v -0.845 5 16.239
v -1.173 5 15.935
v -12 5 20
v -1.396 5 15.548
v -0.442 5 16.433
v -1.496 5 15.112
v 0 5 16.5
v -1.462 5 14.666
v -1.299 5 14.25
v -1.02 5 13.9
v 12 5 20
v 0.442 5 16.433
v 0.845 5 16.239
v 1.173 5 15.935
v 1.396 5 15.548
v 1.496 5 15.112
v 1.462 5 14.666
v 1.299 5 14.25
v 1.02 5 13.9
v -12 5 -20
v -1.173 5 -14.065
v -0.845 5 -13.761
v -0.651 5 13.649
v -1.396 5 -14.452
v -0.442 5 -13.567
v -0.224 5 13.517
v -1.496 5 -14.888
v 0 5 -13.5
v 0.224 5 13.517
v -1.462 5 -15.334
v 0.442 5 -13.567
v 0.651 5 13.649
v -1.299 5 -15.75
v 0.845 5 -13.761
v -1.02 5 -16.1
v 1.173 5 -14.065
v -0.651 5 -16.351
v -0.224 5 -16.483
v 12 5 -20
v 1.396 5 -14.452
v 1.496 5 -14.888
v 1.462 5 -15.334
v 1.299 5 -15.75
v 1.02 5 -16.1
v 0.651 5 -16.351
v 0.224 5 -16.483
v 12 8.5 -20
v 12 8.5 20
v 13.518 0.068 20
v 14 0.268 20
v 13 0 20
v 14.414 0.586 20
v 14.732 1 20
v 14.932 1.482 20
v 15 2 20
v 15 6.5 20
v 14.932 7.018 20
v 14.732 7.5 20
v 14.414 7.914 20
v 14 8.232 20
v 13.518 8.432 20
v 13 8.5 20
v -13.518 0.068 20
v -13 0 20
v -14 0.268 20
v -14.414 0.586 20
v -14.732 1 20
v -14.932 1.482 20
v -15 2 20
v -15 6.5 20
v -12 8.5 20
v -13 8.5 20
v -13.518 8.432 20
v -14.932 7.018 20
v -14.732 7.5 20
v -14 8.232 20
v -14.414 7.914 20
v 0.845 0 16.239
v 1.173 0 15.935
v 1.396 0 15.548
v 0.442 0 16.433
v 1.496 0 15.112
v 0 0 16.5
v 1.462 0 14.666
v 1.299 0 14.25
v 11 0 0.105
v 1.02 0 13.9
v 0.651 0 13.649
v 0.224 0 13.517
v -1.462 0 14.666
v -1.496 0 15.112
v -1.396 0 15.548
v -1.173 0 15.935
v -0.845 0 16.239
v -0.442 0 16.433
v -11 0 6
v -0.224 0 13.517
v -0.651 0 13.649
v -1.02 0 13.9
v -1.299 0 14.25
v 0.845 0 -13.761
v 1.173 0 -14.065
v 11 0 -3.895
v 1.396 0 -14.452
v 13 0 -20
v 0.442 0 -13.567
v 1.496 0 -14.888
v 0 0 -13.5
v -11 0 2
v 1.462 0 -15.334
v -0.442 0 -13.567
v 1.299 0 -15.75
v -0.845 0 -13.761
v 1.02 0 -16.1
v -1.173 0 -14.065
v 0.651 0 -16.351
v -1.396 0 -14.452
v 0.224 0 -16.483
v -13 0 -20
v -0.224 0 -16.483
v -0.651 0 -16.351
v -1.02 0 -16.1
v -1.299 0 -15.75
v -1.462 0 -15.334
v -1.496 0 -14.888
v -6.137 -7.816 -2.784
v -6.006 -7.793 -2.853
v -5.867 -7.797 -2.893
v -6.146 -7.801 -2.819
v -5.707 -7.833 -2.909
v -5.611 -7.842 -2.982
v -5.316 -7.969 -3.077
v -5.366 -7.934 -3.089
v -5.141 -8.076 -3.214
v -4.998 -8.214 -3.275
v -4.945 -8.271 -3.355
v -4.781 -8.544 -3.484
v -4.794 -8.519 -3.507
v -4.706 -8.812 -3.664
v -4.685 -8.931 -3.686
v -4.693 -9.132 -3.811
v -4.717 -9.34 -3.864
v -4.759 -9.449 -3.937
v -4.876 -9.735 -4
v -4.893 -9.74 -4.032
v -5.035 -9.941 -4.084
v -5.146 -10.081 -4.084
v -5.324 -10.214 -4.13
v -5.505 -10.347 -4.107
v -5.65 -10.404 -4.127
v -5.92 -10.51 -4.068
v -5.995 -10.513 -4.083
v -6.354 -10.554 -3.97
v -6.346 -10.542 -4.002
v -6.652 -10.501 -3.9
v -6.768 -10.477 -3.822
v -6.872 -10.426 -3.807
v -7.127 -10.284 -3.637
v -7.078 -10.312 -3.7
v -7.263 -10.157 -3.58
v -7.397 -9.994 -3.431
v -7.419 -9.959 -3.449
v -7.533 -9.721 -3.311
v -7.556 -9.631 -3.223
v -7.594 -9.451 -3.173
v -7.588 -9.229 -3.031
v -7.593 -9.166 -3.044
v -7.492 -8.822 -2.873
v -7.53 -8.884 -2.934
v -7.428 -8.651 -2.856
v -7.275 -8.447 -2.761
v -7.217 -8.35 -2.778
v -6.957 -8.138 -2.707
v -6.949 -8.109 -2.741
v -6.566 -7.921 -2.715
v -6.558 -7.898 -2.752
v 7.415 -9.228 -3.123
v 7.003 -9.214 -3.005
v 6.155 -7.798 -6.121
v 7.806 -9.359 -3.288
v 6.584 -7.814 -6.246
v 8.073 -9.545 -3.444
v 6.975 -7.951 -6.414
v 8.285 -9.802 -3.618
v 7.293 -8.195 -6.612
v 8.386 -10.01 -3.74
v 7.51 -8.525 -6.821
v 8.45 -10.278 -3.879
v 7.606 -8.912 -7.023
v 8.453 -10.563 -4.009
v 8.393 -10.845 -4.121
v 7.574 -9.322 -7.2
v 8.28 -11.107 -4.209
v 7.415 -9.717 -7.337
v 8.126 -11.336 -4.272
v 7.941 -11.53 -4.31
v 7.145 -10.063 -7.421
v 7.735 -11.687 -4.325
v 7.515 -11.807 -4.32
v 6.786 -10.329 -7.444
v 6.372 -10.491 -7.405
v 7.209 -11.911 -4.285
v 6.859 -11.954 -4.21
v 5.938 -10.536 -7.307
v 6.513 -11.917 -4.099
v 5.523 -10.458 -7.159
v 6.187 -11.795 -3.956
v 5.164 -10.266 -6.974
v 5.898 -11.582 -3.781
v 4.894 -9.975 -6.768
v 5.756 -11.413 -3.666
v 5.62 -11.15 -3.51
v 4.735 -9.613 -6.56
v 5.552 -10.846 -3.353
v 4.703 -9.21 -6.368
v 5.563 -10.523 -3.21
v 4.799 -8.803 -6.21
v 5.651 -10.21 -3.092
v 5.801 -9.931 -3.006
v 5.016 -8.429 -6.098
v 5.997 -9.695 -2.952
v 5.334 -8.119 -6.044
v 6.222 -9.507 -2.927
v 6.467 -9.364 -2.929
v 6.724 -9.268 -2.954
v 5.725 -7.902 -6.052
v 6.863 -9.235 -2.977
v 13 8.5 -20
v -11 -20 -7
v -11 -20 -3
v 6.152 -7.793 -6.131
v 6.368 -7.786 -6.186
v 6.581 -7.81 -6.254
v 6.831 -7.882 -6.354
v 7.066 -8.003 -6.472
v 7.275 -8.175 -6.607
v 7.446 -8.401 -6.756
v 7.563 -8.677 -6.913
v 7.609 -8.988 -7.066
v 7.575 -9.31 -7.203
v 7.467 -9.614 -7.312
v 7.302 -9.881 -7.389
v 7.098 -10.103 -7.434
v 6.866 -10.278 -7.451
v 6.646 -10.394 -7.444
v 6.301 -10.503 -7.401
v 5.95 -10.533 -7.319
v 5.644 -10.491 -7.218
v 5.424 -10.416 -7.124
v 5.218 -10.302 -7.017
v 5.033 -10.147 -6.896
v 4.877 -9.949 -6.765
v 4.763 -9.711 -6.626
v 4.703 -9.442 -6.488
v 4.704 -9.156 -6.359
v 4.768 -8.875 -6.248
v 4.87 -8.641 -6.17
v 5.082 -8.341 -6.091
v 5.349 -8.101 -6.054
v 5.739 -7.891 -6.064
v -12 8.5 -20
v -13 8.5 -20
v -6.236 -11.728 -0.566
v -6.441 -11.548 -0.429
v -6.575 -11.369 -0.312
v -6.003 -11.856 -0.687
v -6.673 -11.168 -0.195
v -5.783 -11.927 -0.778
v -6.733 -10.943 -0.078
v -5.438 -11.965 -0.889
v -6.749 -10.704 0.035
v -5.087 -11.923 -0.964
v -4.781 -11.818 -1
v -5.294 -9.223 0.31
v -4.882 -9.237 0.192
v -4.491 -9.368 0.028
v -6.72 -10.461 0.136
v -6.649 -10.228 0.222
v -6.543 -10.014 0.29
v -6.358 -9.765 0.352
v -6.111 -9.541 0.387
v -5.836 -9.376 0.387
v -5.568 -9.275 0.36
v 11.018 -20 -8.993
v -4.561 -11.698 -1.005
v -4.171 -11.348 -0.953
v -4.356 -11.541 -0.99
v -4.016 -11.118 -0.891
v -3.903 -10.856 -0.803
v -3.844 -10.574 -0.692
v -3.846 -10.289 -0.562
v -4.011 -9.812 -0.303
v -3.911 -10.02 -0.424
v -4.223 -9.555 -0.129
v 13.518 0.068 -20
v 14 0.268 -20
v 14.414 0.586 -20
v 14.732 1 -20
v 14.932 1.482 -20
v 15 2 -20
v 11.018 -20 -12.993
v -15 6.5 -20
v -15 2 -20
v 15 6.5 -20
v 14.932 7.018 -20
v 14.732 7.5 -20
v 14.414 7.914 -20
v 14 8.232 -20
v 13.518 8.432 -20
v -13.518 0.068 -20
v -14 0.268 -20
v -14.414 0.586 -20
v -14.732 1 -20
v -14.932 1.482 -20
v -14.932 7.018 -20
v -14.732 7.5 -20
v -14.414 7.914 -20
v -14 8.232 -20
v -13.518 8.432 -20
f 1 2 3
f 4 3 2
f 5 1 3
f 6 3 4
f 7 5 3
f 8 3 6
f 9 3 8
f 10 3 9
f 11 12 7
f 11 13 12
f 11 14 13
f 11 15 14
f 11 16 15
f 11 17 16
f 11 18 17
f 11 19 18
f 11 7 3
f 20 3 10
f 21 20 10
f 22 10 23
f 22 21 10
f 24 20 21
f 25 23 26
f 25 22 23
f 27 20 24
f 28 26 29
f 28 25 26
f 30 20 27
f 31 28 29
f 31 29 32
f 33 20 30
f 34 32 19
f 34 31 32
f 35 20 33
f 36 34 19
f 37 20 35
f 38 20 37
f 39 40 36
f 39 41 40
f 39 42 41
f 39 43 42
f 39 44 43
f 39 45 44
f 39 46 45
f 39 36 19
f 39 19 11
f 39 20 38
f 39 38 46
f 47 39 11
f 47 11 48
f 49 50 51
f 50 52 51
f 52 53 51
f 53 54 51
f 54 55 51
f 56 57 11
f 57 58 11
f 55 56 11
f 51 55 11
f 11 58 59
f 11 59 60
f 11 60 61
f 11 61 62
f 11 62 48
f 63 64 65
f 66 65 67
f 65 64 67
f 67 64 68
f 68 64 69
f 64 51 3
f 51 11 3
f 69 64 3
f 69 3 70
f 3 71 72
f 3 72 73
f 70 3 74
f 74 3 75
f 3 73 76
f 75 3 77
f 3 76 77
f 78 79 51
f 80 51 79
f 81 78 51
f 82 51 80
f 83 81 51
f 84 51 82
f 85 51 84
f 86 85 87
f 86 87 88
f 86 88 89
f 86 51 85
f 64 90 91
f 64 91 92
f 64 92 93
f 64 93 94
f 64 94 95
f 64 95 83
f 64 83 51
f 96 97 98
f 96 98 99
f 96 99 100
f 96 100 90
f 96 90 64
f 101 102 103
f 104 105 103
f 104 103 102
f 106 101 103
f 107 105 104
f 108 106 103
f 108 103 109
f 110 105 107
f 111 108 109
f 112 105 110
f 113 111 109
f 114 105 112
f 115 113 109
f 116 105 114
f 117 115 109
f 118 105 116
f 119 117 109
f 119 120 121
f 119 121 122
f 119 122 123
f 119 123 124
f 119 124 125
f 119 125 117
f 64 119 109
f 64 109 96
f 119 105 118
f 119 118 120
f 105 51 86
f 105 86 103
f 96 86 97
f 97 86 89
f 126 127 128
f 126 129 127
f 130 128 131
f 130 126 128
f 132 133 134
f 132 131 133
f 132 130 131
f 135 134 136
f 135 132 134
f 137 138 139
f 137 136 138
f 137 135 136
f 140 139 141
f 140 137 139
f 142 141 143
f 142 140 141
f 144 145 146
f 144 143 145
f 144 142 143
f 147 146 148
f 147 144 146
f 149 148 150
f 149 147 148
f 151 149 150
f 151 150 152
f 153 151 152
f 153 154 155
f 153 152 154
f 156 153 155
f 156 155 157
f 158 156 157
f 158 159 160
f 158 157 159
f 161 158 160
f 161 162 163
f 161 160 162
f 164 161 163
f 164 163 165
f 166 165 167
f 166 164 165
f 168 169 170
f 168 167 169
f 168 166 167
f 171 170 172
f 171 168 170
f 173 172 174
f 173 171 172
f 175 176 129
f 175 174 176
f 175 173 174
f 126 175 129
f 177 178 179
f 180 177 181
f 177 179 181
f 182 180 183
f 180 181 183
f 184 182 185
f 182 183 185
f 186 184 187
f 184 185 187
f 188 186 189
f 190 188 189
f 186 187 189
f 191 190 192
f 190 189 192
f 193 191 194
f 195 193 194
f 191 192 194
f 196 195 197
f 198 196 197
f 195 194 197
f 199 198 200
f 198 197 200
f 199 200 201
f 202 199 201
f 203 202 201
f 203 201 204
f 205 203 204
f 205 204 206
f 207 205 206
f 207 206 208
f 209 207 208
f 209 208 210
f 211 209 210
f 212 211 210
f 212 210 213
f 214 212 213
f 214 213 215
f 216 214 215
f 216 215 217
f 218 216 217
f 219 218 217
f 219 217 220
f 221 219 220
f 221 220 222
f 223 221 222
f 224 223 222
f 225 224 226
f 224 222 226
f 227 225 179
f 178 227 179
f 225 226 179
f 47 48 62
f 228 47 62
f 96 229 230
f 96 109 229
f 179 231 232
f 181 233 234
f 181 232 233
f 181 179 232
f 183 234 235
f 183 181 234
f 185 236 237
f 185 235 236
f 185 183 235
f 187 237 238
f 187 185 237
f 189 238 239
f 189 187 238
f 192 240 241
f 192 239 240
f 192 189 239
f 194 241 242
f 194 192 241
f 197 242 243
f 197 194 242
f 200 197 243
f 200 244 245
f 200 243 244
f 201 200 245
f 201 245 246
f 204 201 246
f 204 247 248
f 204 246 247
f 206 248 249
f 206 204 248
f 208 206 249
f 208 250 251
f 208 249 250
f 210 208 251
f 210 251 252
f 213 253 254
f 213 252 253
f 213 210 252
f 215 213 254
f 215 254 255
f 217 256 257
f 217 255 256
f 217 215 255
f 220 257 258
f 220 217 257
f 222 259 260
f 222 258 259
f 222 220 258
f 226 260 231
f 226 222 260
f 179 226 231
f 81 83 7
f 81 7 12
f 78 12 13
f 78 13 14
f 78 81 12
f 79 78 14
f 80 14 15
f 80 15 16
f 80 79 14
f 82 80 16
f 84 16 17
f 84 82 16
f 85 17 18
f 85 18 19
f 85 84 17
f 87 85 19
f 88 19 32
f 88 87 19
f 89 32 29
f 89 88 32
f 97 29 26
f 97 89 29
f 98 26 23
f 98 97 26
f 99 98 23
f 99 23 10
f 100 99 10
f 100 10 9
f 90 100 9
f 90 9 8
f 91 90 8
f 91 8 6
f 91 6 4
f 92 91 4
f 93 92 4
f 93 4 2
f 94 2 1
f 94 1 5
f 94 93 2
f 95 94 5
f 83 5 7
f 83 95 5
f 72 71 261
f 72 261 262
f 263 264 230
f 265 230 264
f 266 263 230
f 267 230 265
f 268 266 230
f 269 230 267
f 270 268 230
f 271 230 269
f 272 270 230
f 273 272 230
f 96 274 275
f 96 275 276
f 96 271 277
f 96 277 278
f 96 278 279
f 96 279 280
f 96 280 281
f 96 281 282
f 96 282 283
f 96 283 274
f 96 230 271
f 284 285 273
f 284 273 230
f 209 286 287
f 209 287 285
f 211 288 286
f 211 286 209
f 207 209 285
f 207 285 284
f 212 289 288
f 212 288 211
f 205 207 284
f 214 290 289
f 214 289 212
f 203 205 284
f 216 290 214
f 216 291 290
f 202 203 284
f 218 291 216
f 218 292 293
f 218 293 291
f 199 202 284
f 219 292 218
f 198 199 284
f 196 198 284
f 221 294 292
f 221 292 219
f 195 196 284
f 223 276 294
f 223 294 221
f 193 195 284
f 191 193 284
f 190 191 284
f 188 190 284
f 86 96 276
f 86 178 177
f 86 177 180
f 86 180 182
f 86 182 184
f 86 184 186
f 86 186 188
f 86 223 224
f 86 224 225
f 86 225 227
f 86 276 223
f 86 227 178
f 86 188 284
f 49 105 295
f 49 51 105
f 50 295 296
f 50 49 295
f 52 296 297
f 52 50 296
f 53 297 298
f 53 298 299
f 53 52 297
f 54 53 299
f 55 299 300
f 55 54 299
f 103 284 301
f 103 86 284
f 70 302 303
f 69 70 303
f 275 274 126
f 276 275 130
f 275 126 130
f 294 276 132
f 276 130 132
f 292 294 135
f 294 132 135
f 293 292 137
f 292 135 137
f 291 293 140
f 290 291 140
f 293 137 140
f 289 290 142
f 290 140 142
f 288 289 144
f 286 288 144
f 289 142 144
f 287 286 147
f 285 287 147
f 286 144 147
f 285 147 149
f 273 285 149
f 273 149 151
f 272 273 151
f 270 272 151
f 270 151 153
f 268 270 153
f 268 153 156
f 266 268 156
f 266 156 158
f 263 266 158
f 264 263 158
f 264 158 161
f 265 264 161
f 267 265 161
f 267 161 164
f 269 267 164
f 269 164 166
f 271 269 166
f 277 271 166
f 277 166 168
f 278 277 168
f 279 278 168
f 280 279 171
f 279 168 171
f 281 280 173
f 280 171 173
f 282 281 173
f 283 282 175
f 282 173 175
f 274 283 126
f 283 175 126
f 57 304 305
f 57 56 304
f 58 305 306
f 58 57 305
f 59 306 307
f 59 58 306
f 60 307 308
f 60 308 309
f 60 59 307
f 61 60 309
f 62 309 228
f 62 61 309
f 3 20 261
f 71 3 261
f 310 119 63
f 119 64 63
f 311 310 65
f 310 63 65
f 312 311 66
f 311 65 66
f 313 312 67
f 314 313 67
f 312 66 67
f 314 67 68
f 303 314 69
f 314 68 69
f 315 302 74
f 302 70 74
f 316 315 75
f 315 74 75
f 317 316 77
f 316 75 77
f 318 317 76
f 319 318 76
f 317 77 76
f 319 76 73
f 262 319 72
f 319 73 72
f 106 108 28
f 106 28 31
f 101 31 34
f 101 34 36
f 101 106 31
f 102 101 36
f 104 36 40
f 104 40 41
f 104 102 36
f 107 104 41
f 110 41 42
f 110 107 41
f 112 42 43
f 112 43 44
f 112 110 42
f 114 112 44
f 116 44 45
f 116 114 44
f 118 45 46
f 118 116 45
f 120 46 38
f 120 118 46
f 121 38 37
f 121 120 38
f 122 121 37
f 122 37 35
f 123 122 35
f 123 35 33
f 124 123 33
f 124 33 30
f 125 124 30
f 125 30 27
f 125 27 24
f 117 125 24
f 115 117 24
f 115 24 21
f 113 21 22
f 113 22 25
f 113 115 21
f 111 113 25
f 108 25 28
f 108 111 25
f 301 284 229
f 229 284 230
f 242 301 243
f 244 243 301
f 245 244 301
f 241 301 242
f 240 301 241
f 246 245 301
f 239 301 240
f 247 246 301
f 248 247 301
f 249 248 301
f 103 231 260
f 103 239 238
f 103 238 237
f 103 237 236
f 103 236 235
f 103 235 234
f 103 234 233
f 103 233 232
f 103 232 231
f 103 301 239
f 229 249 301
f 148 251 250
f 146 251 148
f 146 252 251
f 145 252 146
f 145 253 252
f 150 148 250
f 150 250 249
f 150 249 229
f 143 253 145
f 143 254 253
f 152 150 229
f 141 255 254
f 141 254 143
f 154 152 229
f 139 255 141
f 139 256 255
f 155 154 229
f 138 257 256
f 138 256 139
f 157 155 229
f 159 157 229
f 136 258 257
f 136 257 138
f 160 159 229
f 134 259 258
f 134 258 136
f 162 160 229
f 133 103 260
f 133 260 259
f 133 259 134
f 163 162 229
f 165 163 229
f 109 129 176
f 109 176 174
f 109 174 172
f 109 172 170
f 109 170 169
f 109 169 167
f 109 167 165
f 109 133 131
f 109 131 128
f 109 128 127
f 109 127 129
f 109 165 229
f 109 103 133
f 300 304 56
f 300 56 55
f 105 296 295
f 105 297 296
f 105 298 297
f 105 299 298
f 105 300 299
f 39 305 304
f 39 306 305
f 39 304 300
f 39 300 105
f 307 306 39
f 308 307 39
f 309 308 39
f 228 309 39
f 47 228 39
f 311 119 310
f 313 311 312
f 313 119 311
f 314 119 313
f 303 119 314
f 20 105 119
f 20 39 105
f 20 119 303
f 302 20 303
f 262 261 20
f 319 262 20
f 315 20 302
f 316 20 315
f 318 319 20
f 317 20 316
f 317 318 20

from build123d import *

# Parameters (mm, degrees)
SKETCH1_W                      = 22
SKETCH1_H                      = 40
SKETCH1_R                      = 1.5
BOSS_EXTRUDE1_DEPTH            = 5
BOSS_EXTRUDE3_DEPTH            = 40
FILLET1_R                      = 2
CUT_EXTRUDE1_REACH             = 34.746
SKETCH9_R                      = 1.5
CUT_EXTRUDE1_DIRECTION_2_REACH = 34.746


with BuildPart() as part:
    # Sketch1 → Boss-Extrude1 (new body)
    with BuildSketch(Plane(origin=(0, 0, 0), x_dir=(1, 0, 0), z_dir=(0, 1, 0))):
        Rectangle(SKETCH1_W, SKETCH1_H)
        with Locations(Location((0, 15, 0), (0, 0, 270))):
            Circle(SKETCH1_R, mode=Mode.SUBTRACT)
        with Locations(Location((0, -15, 0), (0, 0, 270))):
            Circle(SKETCH1_R, mode=Mode.SUBTRACT)
    extrude(amount=BOSS_EXTRUDE1_DEPTH)

    # Sketch4 → Boss-Extrude3 (add)
    with BuildSketch(Plane(origin=(0, 0, -20), x_dir=(-1, 0, 0), z_dir=(0, 0, -1))):
        Polygon((-11, 5), (-12, 5), (-12, 8.5), (-15, 8.5), (-15, 0), (-11, 0), align=None)
        Polygon((11, 0), (11, 5), (12, 5), (12, 8.5), (15, 8.5), (15, 0), align=None)
    extrude(amount=-BOSS_EXTRUDE3_DEPTH)

    # Fillet1
    fillet1_edges = [part.edges().sort_by_distance(p)[0] for p in [
        (15, 0, 0),
        (15, 8.5, 0),
        (-15, 0, 0),
        (-15, 8.5, 0),
    ]]
    fillet(fillet1_edges, radius=FILLET1_R)

    # Sketch6 → Loft1 section 0
    with BuildSketch(Plane(origin=(0, -20, 0), x_dir=(1, 0, 0), z_dir=(0, 1, 0))):
        with BuildLine():
            Line((11.018014761, 12.99270703), (-11, 7))
            Line((-11, 7), (-11, 3))
            Line((-11, 3), (11.018014761, 8.99270703))
            Line((11.018014761, 8.99270703), (11.018014761, 12.99270703))
        make_face()
    # Sketch2 → Loft1 section 1
    with BuildSketch(Plane.XZ):
        with BuildLine():
            Line((-11, 6), (11, 0.105117767))
            Line((11, 0.105117767), (11, -3.894882233))
            Line((11, -3.894882233), (-11, 2))
            Line((-11, 2), (-11, 6))
        make_face()
    loft()

    # Sketch9 → Cut-Extrude1 (cut, up to next)
    with BuildSketch(Plane(origin=(-0.191463171, 0.319826035, -0.703461542), x_dir=(-0.9706501889890885, -0.09953611163264846, 0.21893097792797594), z_dir=(-0.24049576007790016, 0.4017315961669107, -0.8836138942013866)), mode=Mode.PRIVATE) as cut_extrude1_sk1:
        with Locations(Location((-6.537902116, -11.132046288, 0), (0, 0, 90))):
            Circle(SKETCH9_R)
    cut_extrude1_tool1 = extrude(cut_extrude1_sk1.sketch, amount=-CUT_EXTRUDE1_REACH, mode=Mode.PRIVATE) & part.part
    # Sketch9 → Cut-Extrude1 (cut, up to next)
    with BuildSketch(Plane(origin=(-0.191463171, 0.319826035, -0.703461542), x_dir=(-0.9706501889890885, -0.09953611163264846, 0.21893097792797594), z_dir=(-0.24049576007790016, 0.4017315961669107, -0.8836138942013866)), mode=Mode.PRIVATE) as cut_extrude1_sk2:
        with Locations(Location((6.124840152, -9.767757873, 0), (0, 0, 90))):
            Circle(SKETCH9_R)
    cut_extrude1_tool2 = extrude(cut_extrude1_sk2.sketch, amount=-CUT_EXTRUDE1_REACH, mode=Mode.PRIVATE) & part.part
    add(cut_extrude1_tool1.solids().sort_by_distance((6.154553, -9.163274, -6.74213))[0], mode=Mode.SUBTRACT)
    add(cut_extrude1_tool2.solids().sort_by_distance((-6.13654, -9.181719, -3.405213))[0], mode=Mode.SUBTRACT)

    # Sketch9 → Cut-Extrude1 direction 2 (cut, up to next)
    with BuildSketch(Plane(origin=(-0.191463171, 0.319826035, -0.703461542), x_dir=(-0.9706501889890885, -0.09953611163264846, 0.21893097792797594), z_dir=(-0.24049576007790016, 0.4017315961669107, -0.8836138942013866)), mode=Mode.PRIVATE) as cut_extrude1_direction_2_sk1:
        with Locations(Location((-6.537902116, -11.132046288, 0), (0, 0, 90))):
            Circle(SKETCH9_R)
    cut_extrude1_direction_2_tool1 = extrude(cut_extrude1_direction_2_sk1.sketch, amount=CUT_EXTRUDE1_DIRECTION_2_REACH, mode=Mode.PRIVATE) & part.part
    # Sketch9 → Cut-Extrude1 direction 2 (cut, up to next)
    with BuildSketch(Plane(origin=(-0.191463171, 0.319826035, -0.703461542), x_dir=(-0.9706501889890885, -0.09953611163264846, 0.21893097792797594), z_dir=(-0.24049576007790016, 0.4017315961669107, -0.8836138942013866)), mode=Mode.PRIVATE) as cut_extrude1_direction_2_sk2:
        with Locations(Location((6.124840152, -9.767757873, 0), (0, 0, 90))):
            Circle(SKETCH9_R)
    cut_extrude1_direction_2_tool2 = extrude(cut_extrude1_direction_2_sk2.sketch, amount=CUT_EXTRUDE1_DIRECTION_2_REACH, mode=Mode.PRIVATE) & part.part
    add(cut_extrude1_direction_2_tool1.solids().sort_by_distance((6.154553, -9.163274, -6.74213))[0], mode=Mode.SUBTRACT)
    add(cut_extrude1_direction_2_tool2.solids().sort_by_distance((-6.13654, -9.181719, -3.405213))[0], mode=Mode.SUBTRACT)


solid = part.part
